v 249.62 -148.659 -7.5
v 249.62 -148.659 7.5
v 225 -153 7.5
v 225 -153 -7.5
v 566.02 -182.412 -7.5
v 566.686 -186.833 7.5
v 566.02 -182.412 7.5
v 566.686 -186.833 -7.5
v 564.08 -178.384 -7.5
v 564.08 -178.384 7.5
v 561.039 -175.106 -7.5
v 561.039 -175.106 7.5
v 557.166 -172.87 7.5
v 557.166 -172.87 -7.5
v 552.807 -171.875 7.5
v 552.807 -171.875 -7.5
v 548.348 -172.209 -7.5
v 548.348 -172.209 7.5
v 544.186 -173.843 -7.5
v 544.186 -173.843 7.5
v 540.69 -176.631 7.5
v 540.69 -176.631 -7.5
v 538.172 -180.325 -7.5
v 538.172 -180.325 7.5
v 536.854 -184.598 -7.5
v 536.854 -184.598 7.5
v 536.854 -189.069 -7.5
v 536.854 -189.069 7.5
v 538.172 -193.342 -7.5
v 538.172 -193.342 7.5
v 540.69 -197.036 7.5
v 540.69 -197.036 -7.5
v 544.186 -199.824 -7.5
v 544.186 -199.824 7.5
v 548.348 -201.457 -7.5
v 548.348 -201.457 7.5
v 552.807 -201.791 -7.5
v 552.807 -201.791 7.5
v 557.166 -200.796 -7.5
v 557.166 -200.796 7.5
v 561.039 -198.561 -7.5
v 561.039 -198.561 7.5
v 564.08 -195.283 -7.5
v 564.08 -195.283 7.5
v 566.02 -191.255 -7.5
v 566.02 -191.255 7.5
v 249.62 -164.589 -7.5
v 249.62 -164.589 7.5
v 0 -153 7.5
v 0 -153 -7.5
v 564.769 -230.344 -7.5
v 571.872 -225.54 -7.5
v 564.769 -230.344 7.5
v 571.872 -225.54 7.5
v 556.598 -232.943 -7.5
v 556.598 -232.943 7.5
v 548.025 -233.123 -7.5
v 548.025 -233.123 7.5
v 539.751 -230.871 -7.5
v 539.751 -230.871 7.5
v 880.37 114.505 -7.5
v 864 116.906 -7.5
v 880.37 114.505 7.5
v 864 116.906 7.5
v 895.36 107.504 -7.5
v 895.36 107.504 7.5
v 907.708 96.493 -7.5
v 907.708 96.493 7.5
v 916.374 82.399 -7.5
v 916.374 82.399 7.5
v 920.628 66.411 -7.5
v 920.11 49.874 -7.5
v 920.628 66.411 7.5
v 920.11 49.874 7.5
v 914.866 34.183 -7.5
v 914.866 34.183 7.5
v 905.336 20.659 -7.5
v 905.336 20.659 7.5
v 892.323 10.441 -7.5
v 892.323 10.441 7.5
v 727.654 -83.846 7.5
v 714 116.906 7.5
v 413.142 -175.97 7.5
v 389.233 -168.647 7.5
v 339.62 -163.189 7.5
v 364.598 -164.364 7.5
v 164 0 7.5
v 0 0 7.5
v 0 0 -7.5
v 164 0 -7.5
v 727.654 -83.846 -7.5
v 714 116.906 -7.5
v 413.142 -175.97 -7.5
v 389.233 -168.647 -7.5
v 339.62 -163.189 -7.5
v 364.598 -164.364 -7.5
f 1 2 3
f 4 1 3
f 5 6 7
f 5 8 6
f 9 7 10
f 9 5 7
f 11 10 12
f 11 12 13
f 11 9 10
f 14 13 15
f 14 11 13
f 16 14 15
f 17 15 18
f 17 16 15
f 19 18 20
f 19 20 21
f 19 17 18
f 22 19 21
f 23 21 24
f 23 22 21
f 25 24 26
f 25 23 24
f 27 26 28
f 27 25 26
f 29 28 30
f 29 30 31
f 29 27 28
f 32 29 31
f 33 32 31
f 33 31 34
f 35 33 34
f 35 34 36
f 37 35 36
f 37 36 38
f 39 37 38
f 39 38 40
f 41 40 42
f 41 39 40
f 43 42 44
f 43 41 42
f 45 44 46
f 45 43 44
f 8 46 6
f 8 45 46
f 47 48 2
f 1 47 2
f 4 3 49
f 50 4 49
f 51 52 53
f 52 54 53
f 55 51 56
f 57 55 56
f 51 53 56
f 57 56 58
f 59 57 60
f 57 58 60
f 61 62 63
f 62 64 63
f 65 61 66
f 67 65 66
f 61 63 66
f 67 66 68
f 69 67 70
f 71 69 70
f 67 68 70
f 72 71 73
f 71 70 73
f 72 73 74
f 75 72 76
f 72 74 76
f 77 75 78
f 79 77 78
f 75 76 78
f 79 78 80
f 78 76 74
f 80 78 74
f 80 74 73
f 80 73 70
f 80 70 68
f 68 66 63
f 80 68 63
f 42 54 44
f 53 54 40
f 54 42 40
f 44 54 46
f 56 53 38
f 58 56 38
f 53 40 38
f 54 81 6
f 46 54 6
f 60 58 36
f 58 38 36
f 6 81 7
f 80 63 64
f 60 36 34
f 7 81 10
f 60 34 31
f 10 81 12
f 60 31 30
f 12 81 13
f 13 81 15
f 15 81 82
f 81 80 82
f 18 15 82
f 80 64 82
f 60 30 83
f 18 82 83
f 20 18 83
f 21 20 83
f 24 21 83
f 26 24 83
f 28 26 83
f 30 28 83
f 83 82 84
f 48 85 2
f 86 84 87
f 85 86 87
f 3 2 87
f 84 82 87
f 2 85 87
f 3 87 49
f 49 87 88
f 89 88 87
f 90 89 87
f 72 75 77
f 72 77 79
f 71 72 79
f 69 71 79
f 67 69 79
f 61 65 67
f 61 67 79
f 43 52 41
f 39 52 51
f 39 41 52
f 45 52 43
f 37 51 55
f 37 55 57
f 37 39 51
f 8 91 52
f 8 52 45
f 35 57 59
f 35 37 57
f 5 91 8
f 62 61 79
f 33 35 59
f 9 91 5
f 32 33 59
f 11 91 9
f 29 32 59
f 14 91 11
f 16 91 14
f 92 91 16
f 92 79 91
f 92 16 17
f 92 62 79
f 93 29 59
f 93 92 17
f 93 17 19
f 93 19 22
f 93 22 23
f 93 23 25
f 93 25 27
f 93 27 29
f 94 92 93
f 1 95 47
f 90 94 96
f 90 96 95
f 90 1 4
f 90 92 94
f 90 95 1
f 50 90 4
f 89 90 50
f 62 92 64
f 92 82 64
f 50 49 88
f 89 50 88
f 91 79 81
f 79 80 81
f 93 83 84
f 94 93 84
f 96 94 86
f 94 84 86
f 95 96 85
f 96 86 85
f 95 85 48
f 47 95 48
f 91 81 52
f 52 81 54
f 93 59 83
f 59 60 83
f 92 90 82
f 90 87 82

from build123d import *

# Parameters (mm, degrees)
SKETCH2_R           = 15
BOSS_EXTRUDE1_DEPTH = 7.5


with BuildPart() as part:
    # Sketch2 → Boss-Extrude1 (new body, symmetric)
    with BuildSketch(Plane.XY):
        with BuildLine():
            Line((0, 0), (164, 0))
            Line((164, 0), (714, 116.906108919))
            Line((714, 116.906108919), (864, 116.906108919))
            ThreePointArc((864, 116.906108919), (919.084102522, 74.560174885), (892.323020072, 10.440903632))
            Line((892.323020072, 10.440903632), (727.653990867, -83.846064196))
            Line((727.653990867, -83.846064196), (571.872200418, -225.540335787))
            ThreePointArc((571.872200418, -225.540335787), (556.597798177, -232.94262163), (539.751135216, -230.87111334))
            Line((539.751135216, -230.87111334), (413.142119809, -175.969772575))
            ThreePointArc((413.142119809, -175.969772575), (376.982520463, -166.120087872), (339.620193825, -163.189309492))
            Line((339.620193825, -163.189309492), (249.620193825, -164.588795558))
            Line((249.620193825, -164.588795558), (249.620193825, -148.658795558))
            Line((249.620193825, -148.658795558), (225, -153))
            Line((225, -153), (0, -153))
            Line((0, -153), (0, 0))
        make_face()
        with Locations((551.686209295, -186.833379926)):
            Circle(SKETCH2_R, mode=Mode.SUBTRACT)
    extrude(amount=BOSS_EXTRUDE1_DEPTH, both=True)


solid = part.part
